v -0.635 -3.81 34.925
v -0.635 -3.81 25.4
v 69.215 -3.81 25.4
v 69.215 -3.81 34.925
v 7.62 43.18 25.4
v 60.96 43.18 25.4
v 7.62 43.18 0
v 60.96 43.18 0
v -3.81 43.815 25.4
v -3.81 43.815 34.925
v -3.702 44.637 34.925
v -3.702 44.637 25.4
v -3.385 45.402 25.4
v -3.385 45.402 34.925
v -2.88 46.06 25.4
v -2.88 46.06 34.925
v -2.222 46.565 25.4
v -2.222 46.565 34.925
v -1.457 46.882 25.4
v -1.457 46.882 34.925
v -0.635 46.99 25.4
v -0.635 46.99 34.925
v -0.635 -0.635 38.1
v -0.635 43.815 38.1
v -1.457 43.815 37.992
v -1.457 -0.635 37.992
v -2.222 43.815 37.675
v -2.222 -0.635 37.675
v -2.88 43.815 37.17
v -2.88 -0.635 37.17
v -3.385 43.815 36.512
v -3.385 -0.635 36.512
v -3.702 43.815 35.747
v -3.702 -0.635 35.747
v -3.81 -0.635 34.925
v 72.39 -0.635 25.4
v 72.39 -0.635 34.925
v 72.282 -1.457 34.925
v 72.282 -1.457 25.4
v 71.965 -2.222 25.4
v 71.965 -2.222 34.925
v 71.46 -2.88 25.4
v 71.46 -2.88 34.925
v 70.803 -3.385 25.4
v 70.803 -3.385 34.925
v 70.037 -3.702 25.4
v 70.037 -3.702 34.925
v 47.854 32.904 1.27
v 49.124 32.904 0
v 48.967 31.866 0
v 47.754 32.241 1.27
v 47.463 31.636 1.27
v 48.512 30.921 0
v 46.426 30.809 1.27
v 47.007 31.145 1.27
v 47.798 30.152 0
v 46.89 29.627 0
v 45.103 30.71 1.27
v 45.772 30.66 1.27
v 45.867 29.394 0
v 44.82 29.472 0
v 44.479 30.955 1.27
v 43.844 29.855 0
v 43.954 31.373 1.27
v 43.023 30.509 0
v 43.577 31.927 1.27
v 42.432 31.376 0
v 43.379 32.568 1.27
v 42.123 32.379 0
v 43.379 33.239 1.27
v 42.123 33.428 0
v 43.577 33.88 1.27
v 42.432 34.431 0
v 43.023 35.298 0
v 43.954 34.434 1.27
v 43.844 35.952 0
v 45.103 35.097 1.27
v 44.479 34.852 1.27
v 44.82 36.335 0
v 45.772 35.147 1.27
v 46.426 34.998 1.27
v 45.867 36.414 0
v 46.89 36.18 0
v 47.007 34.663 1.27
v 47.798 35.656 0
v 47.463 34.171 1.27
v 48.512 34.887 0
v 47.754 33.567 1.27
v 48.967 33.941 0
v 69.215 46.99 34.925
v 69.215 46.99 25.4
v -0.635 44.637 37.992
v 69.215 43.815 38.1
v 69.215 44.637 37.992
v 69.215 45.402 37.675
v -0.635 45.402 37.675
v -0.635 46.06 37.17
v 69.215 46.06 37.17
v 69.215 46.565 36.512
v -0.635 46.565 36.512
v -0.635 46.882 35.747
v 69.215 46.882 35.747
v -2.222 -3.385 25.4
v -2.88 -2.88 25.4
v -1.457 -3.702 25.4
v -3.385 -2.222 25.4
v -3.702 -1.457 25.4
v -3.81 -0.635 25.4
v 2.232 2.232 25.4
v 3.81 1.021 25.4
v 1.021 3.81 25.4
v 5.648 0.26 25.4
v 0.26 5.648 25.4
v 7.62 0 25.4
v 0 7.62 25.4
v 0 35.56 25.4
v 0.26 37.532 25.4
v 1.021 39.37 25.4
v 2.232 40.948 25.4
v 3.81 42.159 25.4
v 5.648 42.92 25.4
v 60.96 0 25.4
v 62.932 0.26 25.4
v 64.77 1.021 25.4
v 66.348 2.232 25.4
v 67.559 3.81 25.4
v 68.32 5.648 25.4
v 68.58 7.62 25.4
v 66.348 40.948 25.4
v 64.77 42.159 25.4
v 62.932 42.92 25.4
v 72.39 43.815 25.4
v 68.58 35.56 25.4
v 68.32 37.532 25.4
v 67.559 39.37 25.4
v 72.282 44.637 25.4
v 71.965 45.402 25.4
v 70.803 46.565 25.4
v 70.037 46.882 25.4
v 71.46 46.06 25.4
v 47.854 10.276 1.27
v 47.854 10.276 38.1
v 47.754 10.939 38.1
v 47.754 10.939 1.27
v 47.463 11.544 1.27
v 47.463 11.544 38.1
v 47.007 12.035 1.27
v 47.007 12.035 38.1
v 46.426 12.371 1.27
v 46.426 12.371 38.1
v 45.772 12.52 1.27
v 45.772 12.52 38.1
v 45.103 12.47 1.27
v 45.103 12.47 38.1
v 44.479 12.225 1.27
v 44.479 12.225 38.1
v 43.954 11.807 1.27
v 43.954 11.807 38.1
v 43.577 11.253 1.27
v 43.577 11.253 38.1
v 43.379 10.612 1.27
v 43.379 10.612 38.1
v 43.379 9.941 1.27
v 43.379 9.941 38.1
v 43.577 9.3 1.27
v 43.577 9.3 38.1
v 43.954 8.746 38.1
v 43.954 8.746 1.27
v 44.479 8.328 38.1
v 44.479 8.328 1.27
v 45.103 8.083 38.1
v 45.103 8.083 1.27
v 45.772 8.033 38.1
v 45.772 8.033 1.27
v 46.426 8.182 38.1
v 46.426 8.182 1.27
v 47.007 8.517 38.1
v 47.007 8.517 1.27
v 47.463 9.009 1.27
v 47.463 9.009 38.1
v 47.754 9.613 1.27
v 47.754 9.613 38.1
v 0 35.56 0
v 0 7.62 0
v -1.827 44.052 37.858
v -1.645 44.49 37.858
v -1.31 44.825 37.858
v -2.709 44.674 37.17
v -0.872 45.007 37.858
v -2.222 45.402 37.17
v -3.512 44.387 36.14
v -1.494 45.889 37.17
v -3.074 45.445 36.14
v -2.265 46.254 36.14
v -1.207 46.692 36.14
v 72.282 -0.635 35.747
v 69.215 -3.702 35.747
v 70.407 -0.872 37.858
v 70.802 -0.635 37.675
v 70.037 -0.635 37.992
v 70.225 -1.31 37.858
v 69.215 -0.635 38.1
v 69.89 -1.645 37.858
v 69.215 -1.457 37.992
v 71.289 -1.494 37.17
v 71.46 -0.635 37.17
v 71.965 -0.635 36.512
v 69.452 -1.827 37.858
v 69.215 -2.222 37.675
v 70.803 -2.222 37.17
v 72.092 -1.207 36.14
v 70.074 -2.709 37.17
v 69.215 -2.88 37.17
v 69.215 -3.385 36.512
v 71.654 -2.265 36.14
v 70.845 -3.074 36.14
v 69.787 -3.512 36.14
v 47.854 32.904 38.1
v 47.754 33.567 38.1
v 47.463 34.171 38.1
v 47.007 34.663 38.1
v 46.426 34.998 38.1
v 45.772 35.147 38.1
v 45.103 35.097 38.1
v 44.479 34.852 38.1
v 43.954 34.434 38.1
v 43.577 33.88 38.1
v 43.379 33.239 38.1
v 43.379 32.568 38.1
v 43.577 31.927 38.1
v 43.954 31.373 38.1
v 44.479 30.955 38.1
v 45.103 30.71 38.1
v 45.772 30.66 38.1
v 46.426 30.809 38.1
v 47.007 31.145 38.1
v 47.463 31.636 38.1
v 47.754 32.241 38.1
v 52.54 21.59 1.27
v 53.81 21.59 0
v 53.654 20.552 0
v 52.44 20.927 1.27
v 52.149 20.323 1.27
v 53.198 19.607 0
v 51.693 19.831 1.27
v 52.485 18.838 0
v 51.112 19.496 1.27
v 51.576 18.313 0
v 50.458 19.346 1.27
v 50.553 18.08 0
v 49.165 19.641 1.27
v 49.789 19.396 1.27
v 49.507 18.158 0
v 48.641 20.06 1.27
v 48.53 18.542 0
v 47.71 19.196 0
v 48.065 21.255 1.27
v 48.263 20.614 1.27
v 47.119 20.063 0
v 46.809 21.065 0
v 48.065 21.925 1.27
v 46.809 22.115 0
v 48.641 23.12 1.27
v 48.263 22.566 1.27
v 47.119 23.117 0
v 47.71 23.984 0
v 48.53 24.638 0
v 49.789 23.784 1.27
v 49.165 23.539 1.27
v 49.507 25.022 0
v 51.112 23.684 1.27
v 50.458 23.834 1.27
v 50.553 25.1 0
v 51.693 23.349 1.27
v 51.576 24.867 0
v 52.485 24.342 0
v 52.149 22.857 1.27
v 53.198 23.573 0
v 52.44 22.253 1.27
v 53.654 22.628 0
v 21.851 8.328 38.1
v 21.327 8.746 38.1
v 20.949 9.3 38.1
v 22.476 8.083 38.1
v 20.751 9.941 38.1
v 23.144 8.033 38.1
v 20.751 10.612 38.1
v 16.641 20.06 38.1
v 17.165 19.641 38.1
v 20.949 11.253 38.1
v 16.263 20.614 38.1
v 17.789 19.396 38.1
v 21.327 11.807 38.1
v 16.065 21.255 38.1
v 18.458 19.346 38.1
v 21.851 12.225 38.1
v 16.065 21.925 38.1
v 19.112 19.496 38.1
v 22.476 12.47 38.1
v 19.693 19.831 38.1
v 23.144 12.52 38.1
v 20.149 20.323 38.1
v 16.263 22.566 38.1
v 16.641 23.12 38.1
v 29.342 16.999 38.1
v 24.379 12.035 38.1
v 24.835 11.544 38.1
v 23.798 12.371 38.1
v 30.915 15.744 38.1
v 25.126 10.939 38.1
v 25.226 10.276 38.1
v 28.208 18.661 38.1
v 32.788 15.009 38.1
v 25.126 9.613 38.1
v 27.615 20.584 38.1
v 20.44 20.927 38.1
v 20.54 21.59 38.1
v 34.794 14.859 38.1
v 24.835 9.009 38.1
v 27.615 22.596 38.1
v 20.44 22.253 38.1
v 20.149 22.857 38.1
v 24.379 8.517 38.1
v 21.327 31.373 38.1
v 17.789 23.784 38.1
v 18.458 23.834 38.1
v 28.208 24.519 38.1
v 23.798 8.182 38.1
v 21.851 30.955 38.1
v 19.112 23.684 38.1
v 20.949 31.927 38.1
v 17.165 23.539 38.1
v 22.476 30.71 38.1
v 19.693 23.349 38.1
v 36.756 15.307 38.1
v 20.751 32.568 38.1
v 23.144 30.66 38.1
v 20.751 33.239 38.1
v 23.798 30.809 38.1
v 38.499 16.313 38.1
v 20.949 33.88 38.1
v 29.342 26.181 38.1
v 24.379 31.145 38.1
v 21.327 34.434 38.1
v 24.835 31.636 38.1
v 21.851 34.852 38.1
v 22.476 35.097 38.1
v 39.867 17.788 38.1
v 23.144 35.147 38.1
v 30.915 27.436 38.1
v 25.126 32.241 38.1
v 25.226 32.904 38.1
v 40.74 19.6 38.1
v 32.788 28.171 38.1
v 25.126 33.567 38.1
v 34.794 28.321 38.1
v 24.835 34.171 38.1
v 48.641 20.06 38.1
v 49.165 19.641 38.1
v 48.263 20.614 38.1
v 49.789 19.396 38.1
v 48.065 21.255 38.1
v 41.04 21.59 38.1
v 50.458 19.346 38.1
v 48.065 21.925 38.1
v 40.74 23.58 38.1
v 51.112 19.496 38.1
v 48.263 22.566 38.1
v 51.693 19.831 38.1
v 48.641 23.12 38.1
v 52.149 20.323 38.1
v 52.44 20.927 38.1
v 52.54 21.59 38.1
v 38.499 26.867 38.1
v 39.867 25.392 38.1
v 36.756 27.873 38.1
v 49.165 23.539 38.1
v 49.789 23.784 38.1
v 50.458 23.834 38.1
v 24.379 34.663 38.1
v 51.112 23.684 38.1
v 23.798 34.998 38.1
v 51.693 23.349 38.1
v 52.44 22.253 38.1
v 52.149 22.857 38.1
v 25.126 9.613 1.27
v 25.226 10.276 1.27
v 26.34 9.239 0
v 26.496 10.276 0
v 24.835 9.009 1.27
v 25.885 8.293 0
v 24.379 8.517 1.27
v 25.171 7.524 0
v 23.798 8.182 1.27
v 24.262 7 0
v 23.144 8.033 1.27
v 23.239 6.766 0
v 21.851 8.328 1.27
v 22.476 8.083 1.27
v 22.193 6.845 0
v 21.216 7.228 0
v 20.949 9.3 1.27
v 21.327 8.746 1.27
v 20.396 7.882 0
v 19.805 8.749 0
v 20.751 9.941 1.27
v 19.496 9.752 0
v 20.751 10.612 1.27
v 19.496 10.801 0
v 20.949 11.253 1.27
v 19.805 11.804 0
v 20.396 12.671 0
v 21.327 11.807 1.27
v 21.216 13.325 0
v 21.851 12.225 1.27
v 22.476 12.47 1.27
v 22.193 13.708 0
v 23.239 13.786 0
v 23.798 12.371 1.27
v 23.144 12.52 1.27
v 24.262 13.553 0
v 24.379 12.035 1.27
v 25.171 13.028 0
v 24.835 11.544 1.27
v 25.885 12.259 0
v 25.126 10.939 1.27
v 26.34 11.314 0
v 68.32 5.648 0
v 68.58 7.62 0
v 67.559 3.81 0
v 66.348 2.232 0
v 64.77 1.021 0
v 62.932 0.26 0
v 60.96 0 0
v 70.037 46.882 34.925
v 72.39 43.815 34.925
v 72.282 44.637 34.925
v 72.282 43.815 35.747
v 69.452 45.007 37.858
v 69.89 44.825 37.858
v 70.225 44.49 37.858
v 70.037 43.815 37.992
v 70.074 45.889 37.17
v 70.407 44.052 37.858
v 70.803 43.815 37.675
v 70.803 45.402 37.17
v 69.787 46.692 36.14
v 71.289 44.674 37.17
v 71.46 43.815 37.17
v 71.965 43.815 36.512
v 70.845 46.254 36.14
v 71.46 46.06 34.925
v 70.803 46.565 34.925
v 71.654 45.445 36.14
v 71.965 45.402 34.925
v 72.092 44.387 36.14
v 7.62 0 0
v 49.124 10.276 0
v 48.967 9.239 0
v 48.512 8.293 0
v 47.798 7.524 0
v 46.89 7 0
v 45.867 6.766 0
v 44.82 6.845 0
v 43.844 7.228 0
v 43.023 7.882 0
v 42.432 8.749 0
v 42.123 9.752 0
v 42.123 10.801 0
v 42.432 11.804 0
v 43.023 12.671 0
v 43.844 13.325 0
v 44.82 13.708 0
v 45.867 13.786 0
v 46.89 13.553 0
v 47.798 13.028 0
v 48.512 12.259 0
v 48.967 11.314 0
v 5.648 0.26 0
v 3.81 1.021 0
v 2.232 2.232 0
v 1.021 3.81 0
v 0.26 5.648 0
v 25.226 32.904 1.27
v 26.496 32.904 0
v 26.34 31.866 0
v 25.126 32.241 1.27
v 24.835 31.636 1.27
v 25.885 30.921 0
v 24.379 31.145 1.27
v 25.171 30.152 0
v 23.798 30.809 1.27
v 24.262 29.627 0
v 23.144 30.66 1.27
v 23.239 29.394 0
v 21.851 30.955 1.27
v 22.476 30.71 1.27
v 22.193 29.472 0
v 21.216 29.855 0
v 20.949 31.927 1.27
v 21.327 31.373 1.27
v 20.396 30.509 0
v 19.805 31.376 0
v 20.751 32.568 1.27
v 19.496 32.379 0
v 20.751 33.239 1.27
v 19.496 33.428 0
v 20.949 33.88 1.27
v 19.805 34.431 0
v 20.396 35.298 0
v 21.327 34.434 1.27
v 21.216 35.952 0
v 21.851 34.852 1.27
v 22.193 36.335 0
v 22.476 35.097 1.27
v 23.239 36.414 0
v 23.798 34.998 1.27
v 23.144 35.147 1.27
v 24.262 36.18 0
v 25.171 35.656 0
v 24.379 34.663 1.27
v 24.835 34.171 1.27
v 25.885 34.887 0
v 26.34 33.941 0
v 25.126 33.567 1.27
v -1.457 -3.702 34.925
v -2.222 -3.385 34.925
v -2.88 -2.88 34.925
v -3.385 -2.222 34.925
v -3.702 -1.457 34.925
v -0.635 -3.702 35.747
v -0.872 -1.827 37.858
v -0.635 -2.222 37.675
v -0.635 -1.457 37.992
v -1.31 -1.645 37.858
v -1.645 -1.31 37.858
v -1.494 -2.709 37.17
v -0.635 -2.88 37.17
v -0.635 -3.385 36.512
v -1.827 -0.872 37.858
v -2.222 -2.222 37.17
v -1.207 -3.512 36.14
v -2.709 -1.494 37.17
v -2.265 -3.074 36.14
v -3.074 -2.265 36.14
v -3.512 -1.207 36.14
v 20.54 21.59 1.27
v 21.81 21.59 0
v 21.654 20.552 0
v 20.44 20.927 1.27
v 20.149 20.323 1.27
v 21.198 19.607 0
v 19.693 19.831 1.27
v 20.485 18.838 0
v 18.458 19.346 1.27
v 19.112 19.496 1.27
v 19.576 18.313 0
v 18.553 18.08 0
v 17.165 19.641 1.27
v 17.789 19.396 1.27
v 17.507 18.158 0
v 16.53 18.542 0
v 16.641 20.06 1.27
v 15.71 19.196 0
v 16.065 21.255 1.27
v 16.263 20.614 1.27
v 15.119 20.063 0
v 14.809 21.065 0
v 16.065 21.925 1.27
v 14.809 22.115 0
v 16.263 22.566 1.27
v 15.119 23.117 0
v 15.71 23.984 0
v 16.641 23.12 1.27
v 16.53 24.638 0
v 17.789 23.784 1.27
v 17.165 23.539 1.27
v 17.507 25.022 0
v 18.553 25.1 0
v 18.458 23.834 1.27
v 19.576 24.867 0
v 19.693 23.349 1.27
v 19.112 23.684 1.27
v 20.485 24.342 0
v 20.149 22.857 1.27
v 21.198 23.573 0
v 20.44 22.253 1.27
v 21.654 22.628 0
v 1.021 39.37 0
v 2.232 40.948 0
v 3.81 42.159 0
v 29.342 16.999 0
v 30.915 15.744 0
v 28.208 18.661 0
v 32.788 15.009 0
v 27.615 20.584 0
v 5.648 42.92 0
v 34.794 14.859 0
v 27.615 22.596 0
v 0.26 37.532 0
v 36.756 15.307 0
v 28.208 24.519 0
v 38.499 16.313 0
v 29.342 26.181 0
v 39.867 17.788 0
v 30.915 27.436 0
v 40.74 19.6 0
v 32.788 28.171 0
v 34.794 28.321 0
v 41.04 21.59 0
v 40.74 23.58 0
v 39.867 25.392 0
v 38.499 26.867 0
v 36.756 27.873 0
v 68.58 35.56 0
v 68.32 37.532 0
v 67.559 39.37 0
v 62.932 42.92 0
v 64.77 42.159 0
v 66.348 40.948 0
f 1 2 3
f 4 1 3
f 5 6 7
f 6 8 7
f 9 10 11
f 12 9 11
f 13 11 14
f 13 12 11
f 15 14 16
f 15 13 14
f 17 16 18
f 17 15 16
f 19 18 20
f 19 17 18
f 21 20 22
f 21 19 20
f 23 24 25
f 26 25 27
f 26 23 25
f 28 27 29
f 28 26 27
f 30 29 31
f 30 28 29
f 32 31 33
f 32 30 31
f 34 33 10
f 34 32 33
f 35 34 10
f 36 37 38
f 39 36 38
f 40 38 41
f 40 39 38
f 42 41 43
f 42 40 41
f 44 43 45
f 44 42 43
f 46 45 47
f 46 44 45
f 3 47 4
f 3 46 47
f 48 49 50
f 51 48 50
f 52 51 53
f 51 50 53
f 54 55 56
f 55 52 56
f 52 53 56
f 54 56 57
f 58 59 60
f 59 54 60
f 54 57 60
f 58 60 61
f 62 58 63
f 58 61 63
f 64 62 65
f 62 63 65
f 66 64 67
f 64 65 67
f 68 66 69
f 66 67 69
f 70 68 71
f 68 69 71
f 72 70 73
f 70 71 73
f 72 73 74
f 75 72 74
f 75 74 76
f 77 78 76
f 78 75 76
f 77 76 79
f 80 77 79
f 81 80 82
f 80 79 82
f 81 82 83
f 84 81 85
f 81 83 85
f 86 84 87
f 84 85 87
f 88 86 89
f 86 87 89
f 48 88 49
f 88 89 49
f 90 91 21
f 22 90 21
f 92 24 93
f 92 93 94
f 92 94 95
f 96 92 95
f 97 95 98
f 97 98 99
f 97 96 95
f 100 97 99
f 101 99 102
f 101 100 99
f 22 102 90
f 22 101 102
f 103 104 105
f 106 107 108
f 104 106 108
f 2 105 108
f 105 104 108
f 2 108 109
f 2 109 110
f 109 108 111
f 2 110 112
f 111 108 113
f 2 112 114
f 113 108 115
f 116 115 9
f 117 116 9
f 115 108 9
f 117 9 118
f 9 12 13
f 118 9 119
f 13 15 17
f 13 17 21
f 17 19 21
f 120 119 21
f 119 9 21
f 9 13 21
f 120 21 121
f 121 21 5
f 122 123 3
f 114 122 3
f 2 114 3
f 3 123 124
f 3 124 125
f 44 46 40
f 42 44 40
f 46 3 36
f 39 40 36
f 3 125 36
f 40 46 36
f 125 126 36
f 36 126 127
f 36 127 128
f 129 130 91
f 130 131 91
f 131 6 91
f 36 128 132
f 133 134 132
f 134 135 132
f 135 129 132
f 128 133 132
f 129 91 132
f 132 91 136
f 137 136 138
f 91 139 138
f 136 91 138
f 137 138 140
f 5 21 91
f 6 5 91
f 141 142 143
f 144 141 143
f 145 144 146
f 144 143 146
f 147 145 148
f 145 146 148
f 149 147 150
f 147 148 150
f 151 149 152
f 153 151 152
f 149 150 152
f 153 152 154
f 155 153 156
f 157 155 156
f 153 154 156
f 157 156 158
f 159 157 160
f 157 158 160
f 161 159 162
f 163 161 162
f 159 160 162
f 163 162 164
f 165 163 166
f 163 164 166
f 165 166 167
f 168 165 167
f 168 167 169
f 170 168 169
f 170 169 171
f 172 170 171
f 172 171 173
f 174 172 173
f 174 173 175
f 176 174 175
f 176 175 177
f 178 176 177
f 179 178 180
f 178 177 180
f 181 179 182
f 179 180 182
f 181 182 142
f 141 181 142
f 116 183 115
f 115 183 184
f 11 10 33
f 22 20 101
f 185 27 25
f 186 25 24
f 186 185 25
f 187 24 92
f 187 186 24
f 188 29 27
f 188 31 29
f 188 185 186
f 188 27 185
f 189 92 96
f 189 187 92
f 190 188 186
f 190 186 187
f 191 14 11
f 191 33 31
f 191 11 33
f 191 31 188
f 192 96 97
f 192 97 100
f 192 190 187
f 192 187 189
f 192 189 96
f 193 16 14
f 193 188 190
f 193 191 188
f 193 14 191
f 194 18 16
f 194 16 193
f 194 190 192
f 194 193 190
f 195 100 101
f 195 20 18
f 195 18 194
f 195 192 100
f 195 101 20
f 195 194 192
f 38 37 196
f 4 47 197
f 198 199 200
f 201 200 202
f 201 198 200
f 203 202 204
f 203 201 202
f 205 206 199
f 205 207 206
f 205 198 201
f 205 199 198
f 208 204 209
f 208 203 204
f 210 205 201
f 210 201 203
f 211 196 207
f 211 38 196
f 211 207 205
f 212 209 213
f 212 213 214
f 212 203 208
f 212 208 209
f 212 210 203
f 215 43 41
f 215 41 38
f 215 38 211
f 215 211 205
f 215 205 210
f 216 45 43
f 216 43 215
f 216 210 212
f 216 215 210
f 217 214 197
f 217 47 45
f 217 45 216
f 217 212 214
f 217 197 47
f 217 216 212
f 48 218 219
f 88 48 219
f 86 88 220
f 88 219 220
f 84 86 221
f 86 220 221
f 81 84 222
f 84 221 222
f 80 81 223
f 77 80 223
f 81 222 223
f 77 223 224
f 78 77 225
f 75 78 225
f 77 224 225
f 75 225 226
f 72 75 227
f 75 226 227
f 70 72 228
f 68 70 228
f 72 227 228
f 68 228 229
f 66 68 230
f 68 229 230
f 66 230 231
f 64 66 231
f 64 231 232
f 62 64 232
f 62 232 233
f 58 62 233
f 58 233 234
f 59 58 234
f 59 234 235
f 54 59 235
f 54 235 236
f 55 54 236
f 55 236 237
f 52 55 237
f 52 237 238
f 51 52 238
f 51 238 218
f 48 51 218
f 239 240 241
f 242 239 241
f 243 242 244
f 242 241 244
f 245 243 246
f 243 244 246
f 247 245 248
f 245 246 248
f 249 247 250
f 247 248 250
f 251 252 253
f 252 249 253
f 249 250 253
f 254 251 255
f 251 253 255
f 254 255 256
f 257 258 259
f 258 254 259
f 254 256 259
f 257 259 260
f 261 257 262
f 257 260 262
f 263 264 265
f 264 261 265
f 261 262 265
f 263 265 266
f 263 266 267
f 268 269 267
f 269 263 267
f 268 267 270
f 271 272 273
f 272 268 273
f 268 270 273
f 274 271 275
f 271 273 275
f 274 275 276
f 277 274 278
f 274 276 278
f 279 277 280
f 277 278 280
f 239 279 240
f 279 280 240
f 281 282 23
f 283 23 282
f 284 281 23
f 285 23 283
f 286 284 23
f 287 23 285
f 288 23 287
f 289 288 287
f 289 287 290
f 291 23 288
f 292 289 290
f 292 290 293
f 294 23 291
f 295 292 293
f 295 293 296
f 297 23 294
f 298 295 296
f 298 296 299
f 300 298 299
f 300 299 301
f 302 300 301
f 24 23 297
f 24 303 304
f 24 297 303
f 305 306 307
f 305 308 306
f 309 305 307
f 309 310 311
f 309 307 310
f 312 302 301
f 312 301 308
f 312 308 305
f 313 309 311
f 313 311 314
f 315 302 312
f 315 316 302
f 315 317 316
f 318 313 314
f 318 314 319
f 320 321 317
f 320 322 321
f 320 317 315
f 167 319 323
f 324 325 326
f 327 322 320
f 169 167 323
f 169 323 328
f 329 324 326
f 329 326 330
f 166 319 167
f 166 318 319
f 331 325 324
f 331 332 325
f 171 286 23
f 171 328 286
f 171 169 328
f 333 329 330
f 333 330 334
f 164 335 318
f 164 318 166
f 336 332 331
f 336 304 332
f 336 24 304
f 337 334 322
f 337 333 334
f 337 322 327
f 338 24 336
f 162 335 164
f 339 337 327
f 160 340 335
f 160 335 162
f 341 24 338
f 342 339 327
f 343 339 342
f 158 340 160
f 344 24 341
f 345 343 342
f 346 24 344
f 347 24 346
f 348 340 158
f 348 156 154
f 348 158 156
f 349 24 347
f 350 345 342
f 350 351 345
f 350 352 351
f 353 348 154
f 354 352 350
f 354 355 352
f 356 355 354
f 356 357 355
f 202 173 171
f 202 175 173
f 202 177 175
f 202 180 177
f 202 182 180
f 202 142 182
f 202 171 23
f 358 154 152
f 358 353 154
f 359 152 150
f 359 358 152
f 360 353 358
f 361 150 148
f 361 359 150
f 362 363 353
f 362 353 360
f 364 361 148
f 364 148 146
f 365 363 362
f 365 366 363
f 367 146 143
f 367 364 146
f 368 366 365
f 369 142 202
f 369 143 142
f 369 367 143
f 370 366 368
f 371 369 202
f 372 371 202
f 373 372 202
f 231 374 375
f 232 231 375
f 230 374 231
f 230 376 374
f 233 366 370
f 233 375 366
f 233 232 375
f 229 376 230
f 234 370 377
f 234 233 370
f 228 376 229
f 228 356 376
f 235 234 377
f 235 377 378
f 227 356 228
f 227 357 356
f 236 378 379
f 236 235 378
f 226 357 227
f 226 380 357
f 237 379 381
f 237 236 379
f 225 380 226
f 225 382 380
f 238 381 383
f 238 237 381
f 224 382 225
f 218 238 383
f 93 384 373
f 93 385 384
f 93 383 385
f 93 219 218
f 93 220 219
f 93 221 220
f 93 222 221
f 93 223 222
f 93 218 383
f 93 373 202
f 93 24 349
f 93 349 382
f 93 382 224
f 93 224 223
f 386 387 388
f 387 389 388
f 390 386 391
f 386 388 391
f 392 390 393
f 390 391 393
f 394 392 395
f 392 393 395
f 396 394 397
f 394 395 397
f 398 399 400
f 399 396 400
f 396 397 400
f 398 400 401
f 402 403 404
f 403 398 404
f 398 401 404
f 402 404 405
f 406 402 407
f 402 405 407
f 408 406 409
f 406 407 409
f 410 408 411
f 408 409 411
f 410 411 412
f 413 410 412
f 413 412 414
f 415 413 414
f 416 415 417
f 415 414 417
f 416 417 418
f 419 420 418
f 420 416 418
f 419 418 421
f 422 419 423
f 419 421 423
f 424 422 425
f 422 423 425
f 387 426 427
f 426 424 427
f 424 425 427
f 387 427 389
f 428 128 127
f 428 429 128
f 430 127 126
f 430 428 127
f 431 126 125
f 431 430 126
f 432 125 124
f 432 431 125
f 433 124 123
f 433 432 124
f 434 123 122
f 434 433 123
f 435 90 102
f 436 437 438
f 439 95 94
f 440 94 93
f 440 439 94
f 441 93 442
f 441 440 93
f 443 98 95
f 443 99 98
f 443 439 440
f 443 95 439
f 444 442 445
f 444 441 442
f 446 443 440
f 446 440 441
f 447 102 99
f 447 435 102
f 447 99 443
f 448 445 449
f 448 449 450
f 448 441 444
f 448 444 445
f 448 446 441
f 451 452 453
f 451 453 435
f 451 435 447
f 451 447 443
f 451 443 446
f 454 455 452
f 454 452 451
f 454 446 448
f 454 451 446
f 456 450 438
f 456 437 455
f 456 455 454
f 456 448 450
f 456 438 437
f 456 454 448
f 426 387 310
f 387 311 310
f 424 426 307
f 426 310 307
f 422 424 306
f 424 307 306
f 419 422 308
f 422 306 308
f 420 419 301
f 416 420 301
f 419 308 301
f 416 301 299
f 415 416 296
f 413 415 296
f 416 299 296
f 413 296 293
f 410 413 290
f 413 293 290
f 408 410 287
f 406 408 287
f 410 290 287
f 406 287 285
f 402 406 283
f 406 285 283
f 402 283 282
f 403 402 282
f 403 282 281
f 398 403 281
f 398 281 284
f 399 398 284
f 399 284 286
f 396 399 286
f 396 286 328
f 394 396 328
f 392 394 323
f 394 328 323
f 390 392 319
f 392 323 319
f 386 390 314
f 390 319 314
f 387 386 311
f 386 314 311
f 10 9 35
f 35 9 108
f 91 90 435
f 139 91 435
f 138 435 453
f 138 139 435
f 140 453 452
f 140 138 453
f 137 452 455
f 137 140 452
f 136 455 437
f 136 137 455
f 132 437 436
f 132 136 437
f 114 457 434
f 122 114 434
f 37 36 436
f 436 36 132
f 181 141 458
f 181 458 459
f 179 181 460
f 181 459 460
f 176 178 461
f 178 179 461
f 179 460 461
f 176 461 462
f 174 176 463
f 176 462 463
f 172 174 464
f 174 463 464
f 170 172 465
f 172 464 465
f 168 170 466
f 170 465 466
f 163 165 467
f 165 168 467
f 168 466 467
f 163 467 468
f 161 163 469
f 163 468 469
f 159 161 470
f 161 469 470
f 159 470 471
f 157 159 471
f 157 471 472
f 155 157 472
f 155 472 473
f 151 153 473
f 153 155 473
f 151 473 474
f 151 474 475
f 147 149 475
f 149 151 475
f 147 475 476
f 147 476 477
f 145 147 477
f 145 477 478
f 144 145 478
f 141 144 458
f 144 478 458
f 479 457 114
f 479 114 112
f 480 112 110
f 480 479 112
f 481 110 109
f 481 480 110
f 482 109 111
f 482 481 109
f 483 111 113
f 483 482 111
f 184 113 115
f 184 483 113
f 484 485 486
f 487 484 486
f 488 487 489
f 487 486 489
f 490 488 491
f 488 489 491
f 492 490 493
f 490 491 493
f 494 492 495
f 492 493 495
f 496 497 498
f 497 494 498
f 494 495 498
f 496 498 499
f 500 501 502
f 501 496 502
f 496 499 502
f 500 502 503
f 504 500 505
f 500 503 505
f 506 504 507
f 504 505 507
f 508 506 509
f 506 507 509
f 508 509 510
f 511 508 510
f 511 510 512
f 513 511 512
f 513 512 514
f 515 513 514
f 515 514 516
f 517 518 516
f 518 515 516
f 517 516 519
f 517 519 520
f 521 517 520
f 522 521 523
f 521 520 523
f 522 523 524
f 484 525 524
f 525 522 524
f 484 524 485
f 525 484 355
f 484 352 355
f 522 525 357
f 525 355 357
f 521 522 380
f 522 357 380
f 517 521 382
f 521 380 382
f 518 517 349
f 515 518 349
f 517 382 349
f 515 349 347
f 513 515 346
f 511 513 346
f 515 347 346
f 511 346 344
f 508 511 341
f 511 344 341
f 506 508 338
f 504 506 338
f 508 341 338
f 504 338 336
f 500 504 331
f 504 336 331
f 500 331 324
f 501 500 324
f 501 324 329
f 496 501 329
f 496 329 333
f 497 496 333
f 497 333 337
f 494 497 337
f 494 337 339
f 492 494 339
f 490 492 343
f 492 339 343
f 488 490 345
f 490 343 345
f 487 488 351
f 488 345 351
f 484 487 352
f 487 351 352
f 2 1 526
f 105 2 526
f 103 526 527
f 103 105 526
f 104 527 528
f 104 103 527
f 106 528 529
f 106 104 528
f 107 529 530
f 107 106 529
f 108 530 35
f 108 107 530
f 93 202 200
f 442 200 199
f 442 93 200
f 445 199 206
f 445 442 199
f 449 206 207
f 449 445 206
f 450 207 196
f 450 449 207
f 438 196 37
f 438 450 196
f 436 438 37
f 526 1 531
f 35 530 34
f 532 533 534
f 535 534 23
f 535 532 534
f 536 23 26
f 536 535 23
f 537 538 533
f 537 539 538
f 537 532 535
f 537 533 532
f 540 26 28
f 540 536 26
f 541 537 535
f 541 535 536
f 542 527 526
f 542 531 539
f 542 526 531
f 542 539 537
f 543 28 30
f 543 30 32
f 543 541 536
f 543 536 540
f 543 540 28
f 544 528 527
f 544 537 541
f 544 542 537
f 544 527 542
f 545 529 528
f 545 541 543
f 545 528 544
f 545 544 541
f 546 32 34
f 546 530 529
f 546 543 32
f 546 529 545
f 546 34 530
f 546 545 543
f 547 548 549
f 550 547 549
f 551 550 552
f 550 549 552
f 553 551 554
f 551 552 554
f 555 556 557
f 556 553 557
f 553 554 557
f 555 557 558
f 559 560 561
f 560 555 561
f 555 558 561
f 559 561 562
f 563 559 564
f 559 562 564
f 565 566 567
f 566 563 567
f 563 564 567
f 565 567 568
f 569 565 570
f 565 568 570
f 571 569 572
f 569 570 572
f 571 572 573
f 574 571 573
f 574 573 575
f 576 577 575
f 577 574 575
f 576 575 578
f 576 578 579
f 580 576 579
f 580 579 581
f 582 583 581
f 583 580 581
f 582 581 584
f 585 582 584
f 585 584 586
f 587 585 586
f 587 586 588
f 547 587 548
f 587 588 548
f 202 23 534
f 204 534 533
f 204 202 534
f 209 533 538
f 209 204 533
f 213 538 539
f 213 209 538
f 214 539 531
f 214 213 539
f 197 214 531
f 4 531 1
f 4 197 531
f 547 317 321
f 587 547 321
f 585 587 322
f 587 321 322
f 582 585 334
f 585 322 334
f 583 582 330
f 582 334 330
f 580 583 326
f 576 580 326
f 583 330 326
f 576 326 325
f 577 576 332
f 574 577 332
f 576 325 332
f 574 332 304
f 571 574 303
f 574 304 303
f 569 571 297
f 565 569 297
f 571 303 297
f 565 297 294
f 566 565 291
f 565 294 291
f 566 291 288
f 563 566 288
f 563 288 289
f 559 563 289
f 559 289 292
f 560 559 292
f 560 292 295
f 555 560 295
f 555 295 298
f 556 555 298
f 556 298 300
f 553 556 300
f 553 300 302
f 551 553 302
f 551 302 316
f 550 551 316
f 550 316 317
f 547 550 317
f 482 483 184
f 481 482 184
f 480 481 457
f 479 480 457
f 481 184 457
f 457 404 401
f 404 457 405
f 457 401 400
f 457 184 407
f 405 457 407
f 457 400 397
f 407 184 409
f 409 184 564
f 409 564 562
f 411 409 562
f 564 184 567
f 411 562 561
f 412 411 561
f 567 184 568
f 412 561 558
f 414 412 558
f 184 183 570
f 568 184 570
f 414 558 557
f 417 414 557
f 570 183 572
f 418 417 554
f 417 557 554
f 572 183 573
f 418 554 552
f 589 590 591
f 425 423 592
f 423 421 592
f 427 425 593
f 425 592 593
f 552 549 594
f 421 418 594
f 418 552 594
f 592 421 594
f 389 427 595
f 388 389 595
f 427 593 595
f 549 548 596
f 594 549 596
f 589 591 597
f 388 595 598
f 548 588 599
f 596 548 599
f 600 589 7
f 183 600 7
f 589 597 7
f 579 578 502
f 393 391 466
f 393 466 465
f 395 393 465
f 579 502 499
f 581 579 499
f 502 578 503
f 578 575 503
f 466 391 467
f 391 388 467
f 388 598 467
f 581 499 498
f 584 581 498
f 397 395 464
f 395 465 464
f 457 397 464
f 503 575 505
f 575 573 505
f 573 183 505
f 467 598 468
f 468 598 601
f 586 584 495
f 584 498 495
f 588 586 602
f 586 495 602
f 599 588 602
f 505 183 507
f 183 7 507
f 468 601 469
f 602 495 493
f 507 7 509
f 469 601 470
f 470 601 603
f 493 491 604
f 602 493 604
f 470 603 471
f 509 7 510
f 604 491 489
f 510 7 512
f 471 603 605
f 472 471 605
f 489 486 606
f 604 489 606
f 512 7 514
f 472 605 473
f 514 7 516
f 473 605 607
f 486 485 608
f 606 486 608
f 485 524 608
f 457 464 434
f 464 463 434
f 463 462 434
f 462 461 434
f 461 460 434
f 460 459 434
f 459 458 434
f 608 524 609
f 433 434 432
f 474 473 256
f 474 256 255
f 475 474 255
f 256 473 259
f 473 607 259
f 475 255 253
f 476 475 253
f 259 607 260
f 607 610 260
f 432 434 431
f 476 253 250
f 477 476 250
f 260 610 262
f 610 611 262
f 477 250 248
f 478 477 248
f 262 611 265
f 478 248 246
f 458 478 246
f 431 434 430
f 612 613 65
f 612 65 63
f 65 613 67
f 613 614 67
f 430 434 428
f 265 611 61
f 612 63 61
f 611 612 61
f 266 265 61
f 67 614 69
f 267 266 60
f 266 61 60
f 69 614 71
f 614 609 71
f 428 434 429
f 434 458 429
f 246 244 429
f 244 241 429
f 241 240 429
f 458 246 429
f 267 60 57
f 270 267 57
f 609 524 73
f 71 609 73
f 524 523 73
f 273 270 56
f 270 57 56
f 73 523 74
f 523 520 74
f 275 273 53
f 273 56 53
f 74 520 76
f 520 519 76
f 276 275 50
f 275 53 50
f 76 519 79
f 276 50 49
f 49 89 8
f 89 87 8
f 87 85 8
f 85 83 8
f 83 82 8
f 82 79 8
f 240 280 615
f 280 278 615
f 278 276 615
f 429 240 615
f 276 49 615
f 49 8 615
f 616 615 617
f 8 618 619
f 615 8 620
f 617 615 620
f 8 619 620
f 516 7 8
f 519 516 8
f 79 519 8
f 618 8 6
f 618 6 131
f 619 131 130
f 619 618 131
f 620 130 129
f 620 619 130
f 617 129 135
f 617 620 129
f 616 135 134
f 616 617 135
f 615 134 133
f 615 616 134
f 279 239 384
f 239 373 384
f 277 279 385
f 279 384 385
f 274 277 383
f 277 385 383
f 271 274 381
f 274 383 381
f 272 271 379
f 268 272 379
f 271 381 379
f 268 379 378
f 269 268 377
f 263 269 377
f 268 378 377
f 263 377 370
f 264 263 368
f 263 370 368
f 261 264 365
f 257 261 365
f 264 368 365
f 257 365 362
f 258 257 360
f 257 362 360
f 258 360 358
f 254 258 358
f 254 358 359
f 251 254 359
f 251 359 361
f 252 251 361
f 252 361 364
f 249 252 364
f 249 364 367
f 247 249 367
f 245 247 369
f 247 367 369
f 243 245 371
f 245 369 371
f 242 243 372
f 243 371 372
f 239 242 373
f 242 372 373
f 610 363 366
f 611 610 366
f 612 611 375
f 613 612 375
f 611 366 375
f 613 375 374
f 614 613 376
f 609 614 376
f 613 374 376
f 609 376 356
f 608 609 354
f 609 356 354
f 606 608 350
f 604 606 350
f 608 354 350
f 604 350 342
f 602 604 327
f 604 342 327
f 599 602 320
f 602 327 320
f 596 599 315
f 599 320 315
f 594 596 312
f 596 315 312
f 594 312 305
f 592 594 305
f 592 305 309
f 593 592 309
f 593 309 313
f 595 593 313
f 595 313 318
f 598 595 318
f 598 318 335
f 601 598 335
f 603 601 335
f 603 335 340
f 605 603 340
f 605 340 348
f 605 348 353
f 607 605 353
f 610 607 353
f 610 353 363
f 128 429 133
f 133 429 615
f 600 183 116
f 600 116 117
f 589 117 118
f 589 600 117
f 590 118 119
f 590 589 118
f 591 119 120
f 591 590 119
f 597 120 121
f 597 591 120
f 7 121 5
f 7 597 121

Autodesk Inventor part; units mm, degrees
ref_plane "YZ Plane" through (0, 0, 0) normal (1, 0, 0) x (0, 1, 0)
ref_plane "XZ Plane" through (0, 0, 0) normal (0, 1, 0) x (-1, 0, 0)
ref_plane "XY Plane" through (0, 0, 0) normal (0, 0, 1) x (1, 0, 0)
sketch "Sketch1" plane through (0, 0, 0) normal (0, 0, 1) x (1, 0, 0)
  line L0 (7.62, 0) -> (60.96, 0)
  line L1 (68.58, 7.62) -> (68.58, 35.56)
  line L2 (60.96, 43.18) -> (7.62, 43.18)
  line L3 (0, 35.56) -> (0, 7.62)
  arc A0 (7.62, 43.18) -> (0, 35.56) centre (7.62, 35.56) ccw
  arc A1 (0, 7.62) -> (7.62, 0) centre (7.62, 7.62) ccw
  arc A2 (60.96, 0) -> (68.58, 7.62) centre (60.96, 7.62) ccw
  arc A3 (68.58, 35.56) -> (60.96, 43.18) centre (60.96, 35.56) ccw
  point P0 (0, 0)
  point P1 (68.58, 43.18)
  point P2 (68.58, 0)
  point P3 (0, 43.18)
  dimension "d0" = 68.58
  dimension "d1" = 43.18
  dimension "d2" = 7.62
extrude "Extrusion1" add sketch "Sketch1" along normal blind 25.4
sketch "Sketch2" plane through (0, 0, 25.4) normal (0, 0, 1) x (1, 0, 0)
  line L0 (-0.635, -3.81) -> (69.215, -3.81)
  line L1 (72.39, -0.635) -> (72.39, 43.815)
  line L2 (69.215, 46.99) -> (-0.635, 46.99)
  line L3 (-3.81, 43.815) -> (-3.81, -0.635)
  arc A0 (-0.635, 46.99) -> (-3.81, 43.815) centre (-0.635, 43.815) ccw
  arc A1 (-3.81, -0.635) -> (-0.635, -3.81) centre (-0.635, -0.635) ccw
  arc A2 (69.215, -3.81) -> (72.39, -0.635) centre (69.215, -0.635) ccw
  arc A3 (72.39, 43.815) -> (69.215, 46.99) centre (69.215, 43.815) ccw
  line L4 (60.96, 43.18) -> (7.62, 43.18) construction
  line L5 (0, 35.56) -> (0, 7.62) construction
  point P0 (0, 0)
  point P1 (72.39, 46.99)
  point P2 (72.39, -3.81)
  point P3 (-3.81, 46.99)
  point P4 (34.29, 46.99)
  point P5 (34.29, 43.18)
  point P6 (-3.81, 21.59)
  point P7 (0, 21.59)
  dimension "d5" = 76.2
  dimension "d6" = 50.8
  dimension "d7" = 3.175
extrude "Extrusion2" add sketch "Sketch2" along normal blind 12.7
fillet "Fillet1" radius 3.175 8 edges at (-2.8801, 46.0601, 38.1) (-3.81, 21.59, 38.1) (-2.8801, -2.8801, 38.1) (34.29, -3.81, 38.1) (71.4601, -2.8801, 38.1) (72.39, 21.59, 38.1) (71.4601, 46.0601, 38.1) (34.29, 46.99, 38.1)
sketch "Sketch3" plane through (0, 0, 38.1) normal (0, 0, 1) x (1, 0, 0)
  line L0 (69.215, 46.99) -> (-0.635, 46.99) construction
  line L1 (69.215, 46.99) -> (-0.635, 46.99) construction
  line L2 (-3.81, 43.815) -> (-3.81, -0.635) construction
  line L3 (-3.81, 43.815) -> (-3.81, -0.635) construction
  circle A0 centre (34.29, 21.59) radius 6.75
  circle A1 centre (34.29, 21.59) radius 16 construction
  circle A2 centre (22.9763, 32.9037) radius 2.25
  circle A3 centre (45.6037, 32.9037) radius 2.25
  circle A4 centre (18.29, 21.59) radius 2.25
  circle A5 centre (50.29, 21.59) radius 2.25
  circle A6 centre (22.9763, 10.2763) radius 2.25
  circle A7 centre (45.6037, 10.2763) radius 2.25
  line L4 (22.9763, 32.9037) -> (34.29, 21.59) construction
  line L5 (34.29, 21.59) -> (18.29, 21.59) construction
  point P0 (0, 0)
  point P1 (34.29, 46.99)
  point P2 (-3.81, 21.59)
  point P3 (-3.81, 21.59)
  dimension "d11" = 13.5
  dimension "d14" = 4.5
  dimension "d15" = 32
  dimension "d16" = 45
extrude "Extrusion3" cut sketch "Sketch3" against normal up to surface (38.1 mm away)
chamfer "Chamfer1" distance 1.27 angle 45 6 edges at (43.3537, 32.9037, 0) (20.7263, 32.9037, 0) (16.04, 21.59, 0) (48.04, 21.59, 0) (43.3537, 10.2763, 0) (20.7263, 10.2763, 0)
properties part number "2x3_Spacer_Rear"
